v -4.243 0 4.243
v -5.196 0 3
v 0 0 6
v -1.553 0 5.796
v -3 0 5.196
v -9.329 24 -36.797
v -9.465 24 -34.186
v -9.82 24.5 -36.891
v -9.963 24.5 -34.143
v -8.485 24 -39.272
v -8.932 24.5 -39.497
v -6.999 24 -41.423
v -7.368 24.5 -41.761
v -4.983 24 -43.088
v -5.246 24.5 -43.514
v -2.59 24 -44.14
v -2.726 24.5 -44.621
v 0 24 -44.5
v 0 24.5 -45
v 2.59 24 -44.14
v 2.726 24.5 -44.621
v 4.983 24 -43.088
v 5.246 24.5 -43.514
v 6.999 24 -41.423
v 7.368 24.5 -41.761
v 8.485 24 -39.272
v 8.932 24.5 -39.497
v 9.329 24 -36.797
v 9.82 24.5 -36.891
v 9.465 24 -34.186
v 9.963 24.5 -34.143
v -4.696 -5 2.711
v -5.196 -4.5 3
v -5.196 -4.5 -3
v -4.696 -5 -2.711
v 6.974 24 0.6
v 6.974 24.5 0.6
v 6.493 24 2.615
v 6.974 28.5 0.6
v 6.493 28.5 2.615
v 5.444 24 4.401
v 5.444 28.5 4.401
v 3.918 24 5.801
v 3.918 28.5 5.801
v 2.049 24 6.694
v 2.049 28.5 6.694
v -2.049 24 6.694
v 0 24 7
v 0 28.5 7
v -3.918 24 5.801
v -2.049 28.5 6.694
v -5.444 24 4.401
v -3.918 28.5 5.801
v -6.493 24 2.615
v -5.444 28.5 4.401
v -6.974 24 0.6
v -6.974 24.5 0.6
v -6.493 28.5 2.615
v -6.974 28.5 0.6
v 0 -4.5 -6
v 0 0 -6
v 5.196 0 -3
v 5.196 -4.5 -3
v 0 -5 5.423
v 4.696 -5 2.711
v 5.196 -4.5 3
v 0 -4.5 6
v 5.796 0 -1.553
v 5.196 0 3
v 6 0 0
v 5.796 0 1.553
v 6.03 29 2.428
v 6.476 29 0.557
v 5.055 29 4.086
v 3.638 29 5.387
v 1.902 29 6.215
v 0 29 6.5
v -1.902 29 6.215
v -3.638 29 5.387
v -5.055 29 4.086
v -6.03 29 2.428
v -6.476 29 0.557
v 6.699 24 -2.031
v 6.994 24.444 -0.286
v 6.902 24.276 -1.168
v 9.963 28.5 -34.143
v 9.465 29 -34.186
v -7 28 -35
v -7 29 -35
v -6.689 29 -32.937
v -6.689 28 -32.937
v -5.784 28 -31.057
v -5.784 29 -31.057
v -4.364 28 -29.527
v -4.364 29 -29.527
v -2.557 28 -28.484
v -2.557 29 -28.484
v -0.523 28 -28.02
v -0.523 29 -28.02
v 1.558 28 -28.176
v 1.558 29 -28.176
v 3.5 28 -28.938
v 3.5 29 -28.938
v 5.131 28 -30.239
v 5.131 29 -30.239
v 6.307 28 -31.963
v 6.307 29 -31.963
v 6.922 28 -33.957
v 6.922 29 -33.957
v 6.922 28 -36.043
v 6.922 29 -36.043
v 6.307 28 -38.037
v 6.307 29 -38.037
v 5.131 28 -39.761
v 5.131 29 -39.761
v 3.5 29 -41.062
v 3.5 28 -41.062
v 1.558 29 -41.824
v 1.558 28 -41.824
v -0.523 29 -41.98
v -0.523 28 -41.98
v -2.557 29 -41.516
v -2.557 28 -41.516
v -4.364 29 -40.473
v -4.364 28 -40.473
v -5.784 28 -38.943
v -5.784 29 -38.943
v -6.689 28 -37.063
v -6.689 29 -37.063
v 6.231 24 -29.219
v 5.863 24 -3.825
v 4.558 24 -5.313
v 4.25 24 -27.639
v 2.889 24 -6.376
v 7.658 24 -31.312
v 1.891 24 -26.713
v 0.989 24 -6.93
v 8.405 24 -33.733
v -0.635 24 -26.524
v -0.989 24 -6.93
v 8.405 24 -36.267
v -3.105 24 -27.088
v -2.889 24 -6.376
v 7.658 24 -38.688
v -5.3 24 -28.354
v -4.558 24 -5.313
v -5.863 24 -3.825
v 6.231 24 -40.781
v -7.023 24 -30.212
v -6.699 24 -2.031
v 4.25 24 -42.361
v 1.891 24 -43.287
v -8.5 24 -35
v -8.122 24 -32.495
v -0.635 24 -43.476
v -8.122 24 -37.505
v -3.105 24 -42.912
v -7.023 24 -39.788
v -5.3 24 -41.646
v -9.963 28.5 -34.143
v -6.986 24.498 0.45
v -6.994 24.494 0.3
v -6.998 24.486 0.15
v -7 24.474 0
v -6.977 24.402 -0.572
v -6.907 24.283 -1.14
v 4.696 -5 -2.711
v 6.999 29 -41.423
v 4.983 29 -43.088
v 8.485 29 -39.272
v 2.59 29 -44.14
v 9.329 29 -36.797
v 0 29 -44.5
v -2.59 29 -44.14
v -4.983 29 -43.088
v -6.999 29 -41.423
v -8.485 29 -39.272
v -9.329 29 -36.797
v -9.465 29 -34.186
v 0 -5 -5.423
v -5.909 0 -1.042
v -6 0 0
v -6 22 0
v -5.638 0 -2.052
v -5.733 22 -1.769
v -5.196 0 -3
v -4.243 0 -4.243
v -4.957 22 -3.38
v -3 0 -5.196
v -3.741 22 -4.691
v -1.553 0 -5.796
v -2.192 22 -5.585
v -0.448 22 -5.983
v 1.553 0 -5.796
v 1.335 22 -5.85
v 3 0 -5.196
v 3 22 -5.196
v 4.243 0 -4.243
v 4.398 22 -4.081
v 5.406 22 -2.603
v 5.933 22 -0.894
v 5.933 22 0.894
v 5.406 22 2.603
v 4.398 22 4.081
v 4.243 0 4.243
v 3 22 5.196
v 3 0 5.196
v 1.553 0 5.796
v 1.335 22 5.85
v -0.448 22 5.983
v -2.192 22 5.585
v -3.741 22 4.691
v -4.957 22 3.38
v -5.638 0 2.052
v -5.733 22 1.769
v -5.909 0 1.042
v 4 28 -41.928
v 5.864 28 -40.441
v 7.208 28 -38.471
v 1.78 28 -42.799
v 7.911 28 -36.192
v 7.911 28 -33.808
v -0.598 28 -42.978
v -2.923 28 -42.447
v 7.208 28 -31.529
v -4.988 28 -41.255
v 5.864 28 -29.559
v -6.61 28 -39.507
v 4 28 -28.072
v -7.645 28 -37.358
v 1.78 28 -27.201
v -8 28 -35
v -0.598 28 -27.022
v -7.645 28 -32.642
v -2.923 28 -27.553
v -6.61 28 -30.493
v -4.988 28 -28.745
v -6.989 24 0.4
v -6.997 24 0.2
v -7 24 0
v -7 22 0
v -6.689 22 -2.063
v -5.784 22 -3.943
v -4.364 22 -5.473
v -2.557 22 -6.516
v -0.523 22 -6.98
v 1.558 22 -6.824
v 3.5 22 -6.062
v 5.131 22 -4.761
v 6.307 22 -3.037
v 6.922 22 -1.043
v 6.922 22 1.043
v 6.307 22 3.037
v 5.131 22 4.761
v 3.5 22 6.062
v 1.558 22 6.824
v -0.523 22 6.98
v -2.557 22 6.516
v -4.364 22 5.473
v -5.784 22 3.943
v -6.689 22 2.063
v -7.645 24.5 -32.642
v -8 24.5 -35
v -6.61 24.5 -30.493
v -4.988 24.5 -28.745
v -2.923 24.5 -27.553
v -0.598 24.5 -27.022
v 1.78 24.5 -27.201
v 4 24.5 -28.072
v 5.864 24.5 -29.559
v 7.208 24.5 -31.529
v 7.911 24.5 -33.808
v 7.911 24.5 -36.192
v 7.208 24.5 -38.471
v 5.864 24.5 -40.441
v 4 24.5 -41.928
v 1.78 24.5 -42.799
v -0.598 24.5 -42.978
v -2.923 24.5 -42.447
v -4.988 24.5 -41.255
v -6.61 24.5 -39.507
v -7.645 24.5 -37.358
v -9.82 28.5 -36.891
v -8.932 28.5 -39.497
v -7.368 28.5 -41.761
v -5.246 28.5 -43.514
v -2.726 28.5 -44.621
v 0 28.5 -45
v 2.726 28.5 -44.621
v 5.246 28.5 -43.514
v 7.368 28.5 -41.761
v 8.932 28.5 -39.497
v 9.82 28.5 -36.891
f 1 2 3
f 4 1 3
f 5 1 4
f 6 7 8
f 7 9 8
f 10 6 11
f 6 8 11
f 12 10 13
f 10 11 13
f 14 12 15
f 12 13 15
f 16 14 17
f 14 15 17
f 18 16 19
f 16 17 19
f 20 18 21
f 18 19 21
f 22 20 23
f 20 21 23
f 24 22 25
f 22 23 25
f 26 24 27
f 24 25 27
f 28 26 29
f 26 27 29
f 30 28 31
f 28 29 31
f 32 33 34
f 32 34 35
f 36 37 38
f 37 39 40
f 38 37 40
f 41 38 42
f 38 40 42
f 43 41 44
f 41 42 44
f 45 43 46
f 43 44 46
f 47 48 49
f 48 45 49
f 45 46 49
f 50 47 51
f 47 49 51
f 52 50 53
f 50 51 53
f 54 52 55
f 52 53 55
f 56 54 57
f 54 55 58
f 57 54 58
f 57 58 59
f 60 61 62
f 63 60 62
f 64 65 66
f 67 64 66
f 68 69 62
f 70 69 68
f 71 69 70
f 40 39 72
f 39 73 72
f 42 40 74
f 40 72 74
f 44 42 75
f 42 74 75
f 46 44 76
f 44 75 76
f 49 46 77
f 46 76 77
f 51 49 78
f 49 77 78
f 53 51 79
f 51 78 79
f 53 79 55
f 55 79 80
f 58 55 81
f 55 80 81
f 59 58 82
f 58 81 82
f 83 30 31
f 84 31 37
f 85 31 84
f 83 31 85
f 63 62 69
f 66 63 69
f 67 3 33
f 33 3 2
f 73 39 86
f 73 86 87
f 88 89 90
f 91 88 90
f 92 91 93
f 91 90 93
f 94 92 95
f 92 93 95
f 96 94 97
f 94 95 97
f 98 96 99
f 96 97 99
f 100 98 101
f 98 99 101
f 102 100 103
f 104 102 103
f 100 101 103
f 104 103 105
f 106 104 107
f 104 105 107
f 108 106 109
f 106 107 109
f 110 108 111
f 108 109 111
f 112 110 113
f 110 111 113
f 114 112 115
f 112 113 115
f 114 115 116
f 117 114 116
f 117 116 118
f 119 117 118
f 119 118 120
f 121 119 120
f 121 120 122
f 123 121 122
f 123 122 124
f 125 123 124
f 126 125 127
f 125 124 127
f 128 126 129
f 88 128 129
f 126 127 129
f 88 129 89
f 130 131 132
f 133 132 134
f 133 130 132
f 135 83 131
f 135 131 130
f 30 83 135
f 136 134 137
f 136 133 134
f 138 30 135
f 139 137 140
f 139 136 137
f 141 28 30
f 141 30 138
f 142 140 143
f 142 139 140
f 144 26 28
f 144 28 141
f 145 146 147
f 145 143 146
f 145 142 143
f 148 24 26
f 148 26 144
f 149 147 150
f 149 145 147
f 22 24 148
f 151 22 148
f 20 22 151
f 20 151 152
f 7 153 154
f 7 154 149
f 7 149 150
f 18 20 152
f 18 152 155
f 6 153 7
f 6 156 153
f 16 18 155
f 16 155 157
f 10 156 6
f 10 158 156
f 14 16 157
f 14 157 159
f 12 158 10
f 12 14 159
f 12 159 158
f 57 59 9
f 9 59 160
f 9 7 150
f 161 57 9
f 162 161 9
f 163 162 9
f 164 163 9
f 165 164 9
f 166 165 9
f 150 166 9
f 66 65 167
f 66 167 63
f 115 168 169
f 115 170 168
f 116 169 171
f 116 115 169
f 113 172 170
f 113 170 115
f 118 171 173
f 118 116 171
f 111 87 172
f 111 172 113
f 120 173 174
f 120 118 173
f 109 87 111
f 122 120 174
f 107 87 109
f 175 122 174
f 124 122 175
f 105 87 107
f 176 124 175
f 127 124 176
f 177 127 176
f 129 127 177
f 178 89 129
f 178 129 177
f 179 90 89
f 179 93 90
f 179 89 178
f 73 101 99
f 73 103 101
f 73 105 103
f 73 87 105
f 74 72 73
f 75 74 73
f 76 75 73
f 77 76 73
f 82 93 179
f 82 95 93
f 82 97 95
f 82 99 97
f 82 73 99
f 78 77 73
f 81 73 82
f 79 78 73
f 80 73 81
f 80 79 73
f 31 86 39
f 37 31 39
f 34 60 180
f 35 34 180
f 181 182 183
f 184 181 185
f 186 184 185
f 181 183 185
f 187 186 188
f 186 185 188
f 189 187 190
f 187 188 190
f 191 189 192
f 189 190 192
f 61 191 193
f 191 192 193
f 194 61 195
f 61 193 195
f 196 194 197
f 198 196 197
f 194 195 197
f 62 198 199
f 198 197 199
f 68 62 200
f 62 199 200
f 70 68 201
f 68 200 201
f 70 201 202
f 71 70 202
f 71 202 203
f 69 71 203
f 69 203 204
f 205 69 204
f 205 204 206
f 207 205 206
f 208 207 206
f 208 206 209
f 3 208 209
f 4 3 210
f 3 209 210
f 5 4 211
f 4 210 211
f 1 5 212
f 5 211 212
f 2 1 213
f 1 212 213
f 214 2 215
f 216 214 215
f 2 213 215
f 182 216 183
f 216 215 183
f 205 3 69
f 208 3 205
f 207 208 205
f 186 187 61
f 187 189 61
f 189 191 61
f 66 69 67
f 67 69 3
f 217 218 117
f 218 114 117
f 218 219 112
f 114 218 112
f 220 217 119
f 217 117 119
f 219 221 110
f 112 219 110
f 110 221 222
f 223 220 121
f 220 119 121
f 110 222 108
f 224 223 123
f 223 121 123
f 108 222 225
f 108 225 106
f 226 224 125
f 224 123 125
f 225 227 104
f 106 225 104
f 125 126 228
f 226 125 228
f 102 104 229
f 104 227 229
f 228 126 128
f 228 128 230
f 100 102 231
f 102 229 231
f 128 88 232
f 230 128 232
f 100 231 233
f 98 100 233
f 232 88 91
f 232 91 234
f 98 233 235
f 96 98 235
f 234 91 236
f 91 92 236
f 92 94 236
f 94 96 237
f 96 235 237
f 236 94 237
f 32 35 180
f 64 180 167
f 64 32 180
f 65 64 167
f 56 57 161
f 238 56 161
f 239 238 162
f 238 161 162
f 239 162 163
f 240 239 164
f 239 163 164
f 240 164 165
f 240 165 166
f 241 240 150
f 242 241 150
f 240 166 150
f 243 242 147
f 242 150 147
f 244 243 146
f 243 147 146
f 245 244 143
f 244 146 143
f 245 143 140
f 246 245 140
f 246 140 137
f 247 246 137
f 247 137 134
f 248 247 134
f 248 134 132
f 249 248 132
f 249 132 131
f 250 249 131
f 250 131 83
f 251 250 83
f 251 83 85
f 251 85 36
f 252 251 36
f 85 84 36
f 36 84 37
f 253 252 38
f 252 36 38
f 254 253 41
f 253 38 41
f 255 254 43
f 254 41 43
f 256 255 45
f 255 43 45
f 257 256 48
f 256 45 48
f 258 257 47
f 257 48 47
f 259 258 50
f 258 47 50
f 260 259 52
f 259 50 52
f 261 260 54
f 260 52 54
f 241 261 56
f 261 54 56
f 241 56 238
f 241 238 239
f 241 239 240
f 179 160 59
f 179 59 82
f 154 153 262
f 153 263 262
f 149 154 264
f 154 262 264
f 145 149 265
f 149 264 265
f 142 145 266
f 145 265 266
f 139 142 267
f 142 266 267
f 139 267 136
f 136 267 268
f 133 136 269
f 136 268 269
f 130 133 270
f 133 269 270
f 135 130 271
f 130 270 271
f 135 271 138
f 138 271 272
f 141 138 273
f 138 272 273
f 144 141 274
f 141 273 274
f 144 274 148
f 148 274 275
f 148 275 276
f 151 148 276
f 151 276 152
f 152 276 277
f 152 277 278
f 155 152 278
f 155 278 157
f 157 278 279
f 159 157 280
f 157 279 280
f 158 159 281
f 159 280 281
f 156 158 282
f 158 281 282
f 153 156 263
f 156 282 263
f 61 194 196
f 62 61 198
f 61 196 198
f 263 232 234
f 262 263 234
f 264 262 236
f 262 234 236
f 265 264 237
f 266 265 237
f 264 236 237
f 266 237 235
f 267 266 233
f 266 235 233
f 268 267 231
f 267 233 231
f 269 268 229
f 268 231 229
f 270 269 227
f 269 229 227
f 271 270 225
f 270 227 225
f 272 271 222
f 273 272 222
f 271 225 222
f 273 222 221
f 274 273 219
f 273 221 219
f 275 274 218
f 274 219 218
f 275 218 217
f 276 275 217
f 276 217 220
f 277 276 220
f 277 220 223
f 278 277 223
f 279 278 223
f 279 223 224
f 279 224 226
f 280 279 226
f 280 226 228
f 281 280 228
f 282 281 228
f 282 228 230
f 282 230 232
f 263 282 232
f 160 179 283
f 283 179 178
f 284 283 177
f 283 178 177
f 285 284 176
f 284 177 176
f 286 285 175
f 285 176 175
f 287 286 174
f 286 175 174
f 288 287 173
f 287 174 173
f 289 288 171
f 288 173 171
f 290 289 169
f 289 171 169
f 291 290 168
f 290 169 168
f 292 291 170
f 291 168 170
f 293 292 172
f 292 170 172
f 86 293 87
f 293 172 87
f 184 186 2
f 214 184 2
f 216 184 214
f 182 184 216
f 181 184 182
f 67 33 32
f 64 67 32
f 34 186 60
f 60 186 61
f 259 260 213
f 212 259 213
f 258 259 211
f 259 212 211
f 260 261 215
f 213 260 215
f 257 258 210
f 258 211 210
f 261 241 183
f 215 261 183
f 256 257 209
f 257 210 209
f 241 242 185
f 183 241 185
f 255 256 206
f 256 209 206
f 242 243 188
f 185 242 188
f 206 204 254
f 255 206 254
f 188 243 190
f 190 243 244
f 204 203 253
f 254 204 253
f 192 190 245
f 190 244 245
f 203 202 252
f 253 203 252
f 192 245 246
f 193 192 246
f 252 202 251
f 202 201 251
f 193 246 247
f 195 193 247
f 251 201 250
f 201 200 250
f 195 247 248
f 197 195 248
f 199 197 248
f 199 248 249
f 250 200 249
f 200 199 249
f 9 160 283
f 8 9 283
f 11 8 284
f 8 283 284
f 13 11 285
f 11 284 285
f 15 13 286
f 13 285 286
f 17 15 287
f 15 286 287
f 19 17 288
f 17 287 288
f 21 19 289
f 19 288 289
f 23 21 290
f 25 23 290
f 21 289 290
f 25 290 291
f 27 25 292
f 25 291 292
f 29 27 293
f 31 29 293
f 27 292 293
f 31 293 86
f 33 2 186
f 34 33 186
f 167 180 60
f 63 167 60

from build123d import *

# Parameters (mm, degrees)
BOSS_EXTRUDE3_DEPTH = 5
BOSS_EXTRUDE1_START = 5
SKETCH2_R           = 8
BOSS_EXTRUDE1_DEPTH = 5
SKETCH3_R           = 8
SKETCH3_R_2         = 7
BOSS_EXTRUDE2_DEPTH = 1
CHAMFER1_SIZE       = 0.5


with BuildPart() as part:
    # Sketch1 → Revolve1 (revolve)
    with BuildSketch(Plane.XY, mode=Mode.PRIVATE) as revolve1_sk:
        Polygon((0, 0), (6, 0), (6, 22), (7, 22), (7, 24), (0, 24), align=None)
    revolve(revolve1_sk.sketch.rotate(Axis((0, 24, 0), (0, -1, 0)), 180), axis=Axis((0, 24, 0), (0, -1, 0)))

    # Sketch4 → Boss-Extrude3 (add)
    with BuildSketch(Plane.XZ):
        Polygon((0, 6), (-5.196152423, 3), (-5.196152423, -3), (0, -6), (5.196152423, -3), (5.196152423, 3), align=None)
    extrude(amount=BOSS_EXTRUDE3_DEPTH)

    # Sketch2 → Boss-Extrude1 (add)
    with BuildSketch(Plane(origin=(0, 24, 0), x_dir=(1, 0, 0), z_dir=(0, 1, 0)).offset(BOSS_EXTRUDE1_START)):
        with BuildLine():
            Line((-6.97423831, -0.6), (-9.963197585, 34.142857143))
            ThreePointArc((-9.963197585, 34.142857143), (0, 45), (9.963197585, 34.142857143))
            Line((9.963197585, 34.142857143), (6.97423831, -0.6))
            ThreePointArc((6.97423831, -0.6), (0, -7), (-6.97423831, -0.6))
        make_face()
        with Locations(Location((0, 35, 0), (0, 0, 180))):
            Circle(SKETCH2_R, mode=Mode.SUBTRACT)
    extrude(amount=-BOSS_EXTRUDE1_DEPTH)

    # Sketch3 → Boss-Extrude2 (add)
    with BuildSketch(Plane(origin=(0, 29, 0), x_dir=(1, 0, 0), z_dir=(0, 1, 0))):
        with Locations(Location((0, 35, 0), (0, 0, 180))):
            Circle(SKETCH3_R)
        with Locations(Location((0, 35, 0), (0, 0, 180))):
            Circle(SKETCH3_R_2, mode=Mode.SUBTRACT)
    extrude(amount=-BOSS_EXTRUDE2_DEPTH)

    # Chamfer1
    # the kernel refuses this chamfer: 0.5 mm, written as the material it takes off along each edge
    with BuildSketch(Plane(origin=(6.309723822, -5, 2.357079253), x_dir=(-0.49981095845564877, -0.027495876610585633, -0.86569797422488), z_dir=(-0.8660254037844385, 0, 0.5000000000000004)), Plane(origin=(-1.113571399, -5, -6.642920747), x_dir=(-0.4998109584556486, -0.0274958766105856, 0.8656979742248803), z_dir=(0.8660254037844386, 0, 0.5000000000000002)), Plane(origin=(5.196152423, -5, -4.285841494), x_dir=(-0.9996219169112968, -0.027495876610585647, 0), z_dir=(0, 0, 1))) as chamfer1_piece_1:
        Polygon((CHAMFER1_SIZE * 0.999621916911, -CHAMFER1_SIZE * 0.0274958766106), (-CHAMFER1_SIZE * 0.0274958766106, -CHAMFER1_SIZE * 0.999621916911), (0, 0), align=None)
    extrude(amount=8.571682988, mode=Mode.SUBTRACT)
    with BuildSketch(Plane(origin=(1.113571399, -5, 6.642920747), x_dir=(-0.013747938305293307, 0.9996219169112968, 0.02381212764409039), z_dir=(-0.8660254037844385, 0, -0.5000000000000004)), Plane(origin=(-5.196152423, -5, 4.285841494), x_dir=(-0.027495876610585647, 0.9996219169112968, 0), z_dir=(0, 0, -1)), Plane(origin=(-6.309723822, -5, -2.357079253), x_dir=(-0.013747938305292924, 0.9996219169112968, -0.023812127644089753), z_dir=(0.8660254037844386, 0, -0.5000000000000001))) as chamfer1_piece_2:
        Polygon((CHAMFER1_SIZE * 0.999621916911, CHAMFER1_SIZE * 0.0274958766106), (-CHAMFER1_SIZE * 0.0274958766106, CHAMFER1_SIZE * 0.999621916911), (0, 0), align=None)
    extrude(amount=8.571682988, mode=Mode.SUBTRACT)
    with BuildSketch(Plane(origin=(0, 24, -35), x_dir=(-1, 0, 0), z_dir=(0, 0, -1))) as chamfer1_piece_3:
        Polygon((8 + CHAMFER1_SIZE, 0), (8, CHAMFER1_SIZE), (8, 0), align=None)
    revolve(axis=Axis((0, 24, -35), (0, 1, 0)), mode=Mode.SUBTRACT)
    with BuildSketch(Plane(origin=(0, 29, 0), x_dir=(0.9963197585235825, 0, 0.08571428571428559), z_dir=(0.08571428571428559, 0, -0.9963197585235825))) as chamfer1_piece_4:
        Polygon((7, CHAMFER1_SIZE), (7 - CHAMFER1_SIZE, 0), (7, 0), align=None)
    revolve(axis=Axis((0, 29, 0), (0, -1, 0)), revolution_arc=170.165799329, mode=Mode.SUBTRACT)
    with BuildSketch(Plane(origin=(9.963197585, 29, -34.142857143), x_dir=(0.027394685145053735, -0.9996219169112968, 0.002356789423764555), z_dir=(-0.08571428571428572, 0, 0.9963197585235826)), Plane(origin=(-6.97423831, 29, 0.6), x_dir=(-0.027394685145053995, -0.9996219169112968, 0.0023567894237645753), z_dir=(-0.08571428571428566, 0, -0.9963197585235826))) as chamfer1_piece_5:
        Polygon((CHAMFER1_SIZE * 0.999621916911, -CHAMFER1_SIZE * 0.0274958766106), (-CHAMFER1_SIZE * 0.0274958766106, -CHAMFER1_SIZE * 0.999621916911), (0, 0), align=None)
    extrude(amount=34.871191548, mode=Mode.SUBTRACT)
    with BuildSketch(Plane(origin=(0, 29, -35), x_dir=(-0.9963197585235826, 0, 0.08571428571428541), z_dir=(0.08571428571428541, 0, 0.9963197585235826))) as chamfer1_piece_6:
        Polygon((10, CHAMFER1_SIZE), (10 - CHAMFER1_SIZE, 0), (10, 0), align=None)
    revolve(axis=Axis((0, 29, -35), (0, -1, 0)), revolution_arc=189.834200671, mode=Mode.SUBTRACT)
    with BuildSketch(Plane(origin=(9.963197585, 24, -34.142857143), x_dir=(-0.9959430668719438, -0.027495876610589047, -0.08568187859239684), z_dir=(-0.08571428571428572, 0, 0.9963197585235826))) as chamfer1_piece_7_section:
        Polygon((CHAMFER1_SIZE * 0.999621916911, -CHAMFER1_SIZE * 0.0274958766106), (-CHAMFER1_SIZE * 0.0274958766106, -CHAMFER1_SIZE * 0.999621916911), (0, 0), align=None)
    chamfer1_piece_7 = extrude(amount=36.157033042, mode=Mode.PRIVATE)
    chamfer1_piece_7 = chamfer1_piece_7 - Plane(origin=(0, 24.16673509, 0), x_dir=(-1, 0, 0), z_dir=(0, 1, 0)) * Cylinder(7, 75, mode=Mode.PRIVATE)
    add(chamfer1_piece_7, mode=Mode.SUBTRACT)
    with BuildSketch(Plane(origin=(0, 24, -35), x_dir=(-0.9963197585235826, 0, 0.08571428571428541), z_dir=(0.08571428571428541, 0, 0.9963197585235826))) as chamfer1_piece_8:
        Polygon((10 - CHAMFER1_SIZE, 0), (10, -CHAMFER1_SIZE), (10, 0), align=None)
    revolve(axis=Axis((0, 24, -35), (0, -1, 0)), revolution_arc=189.834200671, mode=Mode.SUBTRACT)
    with BuildSketch(Plane(origin=(-6.864023324, 24, 1.881109287), x_dir=(0.9959430668719438, -0.02749587661058904, -0.0856818785923968), z_dir=(-0.08571428571428566, 0, -0.9963197585235826))) as chamfer1_piece_9_section:
        Polygon((CHAMFER1_SIZE * 0.999621916911, -CHAMFER1_SIZE * 0.0274958766106), (-CHAMFER1_SIZE * 0.0274958766106, -CHAMFER1_SIZE * 0.999621916911), (0, 0), align=None)
    chamfer1_piece_9 = extrude(amount=36.157033042, mode=Mode.PRIVATE)
    chamfer1_piece_9 = chamfer1_piece_9 - Plane(origin=(0, 24.166735092, 0), x_dir=(-1, 0, 0), z_dir=(0, 1, 0)) * Cylinder(7, 75, mode=Mode.PRIVATE)
    add(chamfer1_piece_9, mode=Mode.SUBTRACT)


solid = part.part
